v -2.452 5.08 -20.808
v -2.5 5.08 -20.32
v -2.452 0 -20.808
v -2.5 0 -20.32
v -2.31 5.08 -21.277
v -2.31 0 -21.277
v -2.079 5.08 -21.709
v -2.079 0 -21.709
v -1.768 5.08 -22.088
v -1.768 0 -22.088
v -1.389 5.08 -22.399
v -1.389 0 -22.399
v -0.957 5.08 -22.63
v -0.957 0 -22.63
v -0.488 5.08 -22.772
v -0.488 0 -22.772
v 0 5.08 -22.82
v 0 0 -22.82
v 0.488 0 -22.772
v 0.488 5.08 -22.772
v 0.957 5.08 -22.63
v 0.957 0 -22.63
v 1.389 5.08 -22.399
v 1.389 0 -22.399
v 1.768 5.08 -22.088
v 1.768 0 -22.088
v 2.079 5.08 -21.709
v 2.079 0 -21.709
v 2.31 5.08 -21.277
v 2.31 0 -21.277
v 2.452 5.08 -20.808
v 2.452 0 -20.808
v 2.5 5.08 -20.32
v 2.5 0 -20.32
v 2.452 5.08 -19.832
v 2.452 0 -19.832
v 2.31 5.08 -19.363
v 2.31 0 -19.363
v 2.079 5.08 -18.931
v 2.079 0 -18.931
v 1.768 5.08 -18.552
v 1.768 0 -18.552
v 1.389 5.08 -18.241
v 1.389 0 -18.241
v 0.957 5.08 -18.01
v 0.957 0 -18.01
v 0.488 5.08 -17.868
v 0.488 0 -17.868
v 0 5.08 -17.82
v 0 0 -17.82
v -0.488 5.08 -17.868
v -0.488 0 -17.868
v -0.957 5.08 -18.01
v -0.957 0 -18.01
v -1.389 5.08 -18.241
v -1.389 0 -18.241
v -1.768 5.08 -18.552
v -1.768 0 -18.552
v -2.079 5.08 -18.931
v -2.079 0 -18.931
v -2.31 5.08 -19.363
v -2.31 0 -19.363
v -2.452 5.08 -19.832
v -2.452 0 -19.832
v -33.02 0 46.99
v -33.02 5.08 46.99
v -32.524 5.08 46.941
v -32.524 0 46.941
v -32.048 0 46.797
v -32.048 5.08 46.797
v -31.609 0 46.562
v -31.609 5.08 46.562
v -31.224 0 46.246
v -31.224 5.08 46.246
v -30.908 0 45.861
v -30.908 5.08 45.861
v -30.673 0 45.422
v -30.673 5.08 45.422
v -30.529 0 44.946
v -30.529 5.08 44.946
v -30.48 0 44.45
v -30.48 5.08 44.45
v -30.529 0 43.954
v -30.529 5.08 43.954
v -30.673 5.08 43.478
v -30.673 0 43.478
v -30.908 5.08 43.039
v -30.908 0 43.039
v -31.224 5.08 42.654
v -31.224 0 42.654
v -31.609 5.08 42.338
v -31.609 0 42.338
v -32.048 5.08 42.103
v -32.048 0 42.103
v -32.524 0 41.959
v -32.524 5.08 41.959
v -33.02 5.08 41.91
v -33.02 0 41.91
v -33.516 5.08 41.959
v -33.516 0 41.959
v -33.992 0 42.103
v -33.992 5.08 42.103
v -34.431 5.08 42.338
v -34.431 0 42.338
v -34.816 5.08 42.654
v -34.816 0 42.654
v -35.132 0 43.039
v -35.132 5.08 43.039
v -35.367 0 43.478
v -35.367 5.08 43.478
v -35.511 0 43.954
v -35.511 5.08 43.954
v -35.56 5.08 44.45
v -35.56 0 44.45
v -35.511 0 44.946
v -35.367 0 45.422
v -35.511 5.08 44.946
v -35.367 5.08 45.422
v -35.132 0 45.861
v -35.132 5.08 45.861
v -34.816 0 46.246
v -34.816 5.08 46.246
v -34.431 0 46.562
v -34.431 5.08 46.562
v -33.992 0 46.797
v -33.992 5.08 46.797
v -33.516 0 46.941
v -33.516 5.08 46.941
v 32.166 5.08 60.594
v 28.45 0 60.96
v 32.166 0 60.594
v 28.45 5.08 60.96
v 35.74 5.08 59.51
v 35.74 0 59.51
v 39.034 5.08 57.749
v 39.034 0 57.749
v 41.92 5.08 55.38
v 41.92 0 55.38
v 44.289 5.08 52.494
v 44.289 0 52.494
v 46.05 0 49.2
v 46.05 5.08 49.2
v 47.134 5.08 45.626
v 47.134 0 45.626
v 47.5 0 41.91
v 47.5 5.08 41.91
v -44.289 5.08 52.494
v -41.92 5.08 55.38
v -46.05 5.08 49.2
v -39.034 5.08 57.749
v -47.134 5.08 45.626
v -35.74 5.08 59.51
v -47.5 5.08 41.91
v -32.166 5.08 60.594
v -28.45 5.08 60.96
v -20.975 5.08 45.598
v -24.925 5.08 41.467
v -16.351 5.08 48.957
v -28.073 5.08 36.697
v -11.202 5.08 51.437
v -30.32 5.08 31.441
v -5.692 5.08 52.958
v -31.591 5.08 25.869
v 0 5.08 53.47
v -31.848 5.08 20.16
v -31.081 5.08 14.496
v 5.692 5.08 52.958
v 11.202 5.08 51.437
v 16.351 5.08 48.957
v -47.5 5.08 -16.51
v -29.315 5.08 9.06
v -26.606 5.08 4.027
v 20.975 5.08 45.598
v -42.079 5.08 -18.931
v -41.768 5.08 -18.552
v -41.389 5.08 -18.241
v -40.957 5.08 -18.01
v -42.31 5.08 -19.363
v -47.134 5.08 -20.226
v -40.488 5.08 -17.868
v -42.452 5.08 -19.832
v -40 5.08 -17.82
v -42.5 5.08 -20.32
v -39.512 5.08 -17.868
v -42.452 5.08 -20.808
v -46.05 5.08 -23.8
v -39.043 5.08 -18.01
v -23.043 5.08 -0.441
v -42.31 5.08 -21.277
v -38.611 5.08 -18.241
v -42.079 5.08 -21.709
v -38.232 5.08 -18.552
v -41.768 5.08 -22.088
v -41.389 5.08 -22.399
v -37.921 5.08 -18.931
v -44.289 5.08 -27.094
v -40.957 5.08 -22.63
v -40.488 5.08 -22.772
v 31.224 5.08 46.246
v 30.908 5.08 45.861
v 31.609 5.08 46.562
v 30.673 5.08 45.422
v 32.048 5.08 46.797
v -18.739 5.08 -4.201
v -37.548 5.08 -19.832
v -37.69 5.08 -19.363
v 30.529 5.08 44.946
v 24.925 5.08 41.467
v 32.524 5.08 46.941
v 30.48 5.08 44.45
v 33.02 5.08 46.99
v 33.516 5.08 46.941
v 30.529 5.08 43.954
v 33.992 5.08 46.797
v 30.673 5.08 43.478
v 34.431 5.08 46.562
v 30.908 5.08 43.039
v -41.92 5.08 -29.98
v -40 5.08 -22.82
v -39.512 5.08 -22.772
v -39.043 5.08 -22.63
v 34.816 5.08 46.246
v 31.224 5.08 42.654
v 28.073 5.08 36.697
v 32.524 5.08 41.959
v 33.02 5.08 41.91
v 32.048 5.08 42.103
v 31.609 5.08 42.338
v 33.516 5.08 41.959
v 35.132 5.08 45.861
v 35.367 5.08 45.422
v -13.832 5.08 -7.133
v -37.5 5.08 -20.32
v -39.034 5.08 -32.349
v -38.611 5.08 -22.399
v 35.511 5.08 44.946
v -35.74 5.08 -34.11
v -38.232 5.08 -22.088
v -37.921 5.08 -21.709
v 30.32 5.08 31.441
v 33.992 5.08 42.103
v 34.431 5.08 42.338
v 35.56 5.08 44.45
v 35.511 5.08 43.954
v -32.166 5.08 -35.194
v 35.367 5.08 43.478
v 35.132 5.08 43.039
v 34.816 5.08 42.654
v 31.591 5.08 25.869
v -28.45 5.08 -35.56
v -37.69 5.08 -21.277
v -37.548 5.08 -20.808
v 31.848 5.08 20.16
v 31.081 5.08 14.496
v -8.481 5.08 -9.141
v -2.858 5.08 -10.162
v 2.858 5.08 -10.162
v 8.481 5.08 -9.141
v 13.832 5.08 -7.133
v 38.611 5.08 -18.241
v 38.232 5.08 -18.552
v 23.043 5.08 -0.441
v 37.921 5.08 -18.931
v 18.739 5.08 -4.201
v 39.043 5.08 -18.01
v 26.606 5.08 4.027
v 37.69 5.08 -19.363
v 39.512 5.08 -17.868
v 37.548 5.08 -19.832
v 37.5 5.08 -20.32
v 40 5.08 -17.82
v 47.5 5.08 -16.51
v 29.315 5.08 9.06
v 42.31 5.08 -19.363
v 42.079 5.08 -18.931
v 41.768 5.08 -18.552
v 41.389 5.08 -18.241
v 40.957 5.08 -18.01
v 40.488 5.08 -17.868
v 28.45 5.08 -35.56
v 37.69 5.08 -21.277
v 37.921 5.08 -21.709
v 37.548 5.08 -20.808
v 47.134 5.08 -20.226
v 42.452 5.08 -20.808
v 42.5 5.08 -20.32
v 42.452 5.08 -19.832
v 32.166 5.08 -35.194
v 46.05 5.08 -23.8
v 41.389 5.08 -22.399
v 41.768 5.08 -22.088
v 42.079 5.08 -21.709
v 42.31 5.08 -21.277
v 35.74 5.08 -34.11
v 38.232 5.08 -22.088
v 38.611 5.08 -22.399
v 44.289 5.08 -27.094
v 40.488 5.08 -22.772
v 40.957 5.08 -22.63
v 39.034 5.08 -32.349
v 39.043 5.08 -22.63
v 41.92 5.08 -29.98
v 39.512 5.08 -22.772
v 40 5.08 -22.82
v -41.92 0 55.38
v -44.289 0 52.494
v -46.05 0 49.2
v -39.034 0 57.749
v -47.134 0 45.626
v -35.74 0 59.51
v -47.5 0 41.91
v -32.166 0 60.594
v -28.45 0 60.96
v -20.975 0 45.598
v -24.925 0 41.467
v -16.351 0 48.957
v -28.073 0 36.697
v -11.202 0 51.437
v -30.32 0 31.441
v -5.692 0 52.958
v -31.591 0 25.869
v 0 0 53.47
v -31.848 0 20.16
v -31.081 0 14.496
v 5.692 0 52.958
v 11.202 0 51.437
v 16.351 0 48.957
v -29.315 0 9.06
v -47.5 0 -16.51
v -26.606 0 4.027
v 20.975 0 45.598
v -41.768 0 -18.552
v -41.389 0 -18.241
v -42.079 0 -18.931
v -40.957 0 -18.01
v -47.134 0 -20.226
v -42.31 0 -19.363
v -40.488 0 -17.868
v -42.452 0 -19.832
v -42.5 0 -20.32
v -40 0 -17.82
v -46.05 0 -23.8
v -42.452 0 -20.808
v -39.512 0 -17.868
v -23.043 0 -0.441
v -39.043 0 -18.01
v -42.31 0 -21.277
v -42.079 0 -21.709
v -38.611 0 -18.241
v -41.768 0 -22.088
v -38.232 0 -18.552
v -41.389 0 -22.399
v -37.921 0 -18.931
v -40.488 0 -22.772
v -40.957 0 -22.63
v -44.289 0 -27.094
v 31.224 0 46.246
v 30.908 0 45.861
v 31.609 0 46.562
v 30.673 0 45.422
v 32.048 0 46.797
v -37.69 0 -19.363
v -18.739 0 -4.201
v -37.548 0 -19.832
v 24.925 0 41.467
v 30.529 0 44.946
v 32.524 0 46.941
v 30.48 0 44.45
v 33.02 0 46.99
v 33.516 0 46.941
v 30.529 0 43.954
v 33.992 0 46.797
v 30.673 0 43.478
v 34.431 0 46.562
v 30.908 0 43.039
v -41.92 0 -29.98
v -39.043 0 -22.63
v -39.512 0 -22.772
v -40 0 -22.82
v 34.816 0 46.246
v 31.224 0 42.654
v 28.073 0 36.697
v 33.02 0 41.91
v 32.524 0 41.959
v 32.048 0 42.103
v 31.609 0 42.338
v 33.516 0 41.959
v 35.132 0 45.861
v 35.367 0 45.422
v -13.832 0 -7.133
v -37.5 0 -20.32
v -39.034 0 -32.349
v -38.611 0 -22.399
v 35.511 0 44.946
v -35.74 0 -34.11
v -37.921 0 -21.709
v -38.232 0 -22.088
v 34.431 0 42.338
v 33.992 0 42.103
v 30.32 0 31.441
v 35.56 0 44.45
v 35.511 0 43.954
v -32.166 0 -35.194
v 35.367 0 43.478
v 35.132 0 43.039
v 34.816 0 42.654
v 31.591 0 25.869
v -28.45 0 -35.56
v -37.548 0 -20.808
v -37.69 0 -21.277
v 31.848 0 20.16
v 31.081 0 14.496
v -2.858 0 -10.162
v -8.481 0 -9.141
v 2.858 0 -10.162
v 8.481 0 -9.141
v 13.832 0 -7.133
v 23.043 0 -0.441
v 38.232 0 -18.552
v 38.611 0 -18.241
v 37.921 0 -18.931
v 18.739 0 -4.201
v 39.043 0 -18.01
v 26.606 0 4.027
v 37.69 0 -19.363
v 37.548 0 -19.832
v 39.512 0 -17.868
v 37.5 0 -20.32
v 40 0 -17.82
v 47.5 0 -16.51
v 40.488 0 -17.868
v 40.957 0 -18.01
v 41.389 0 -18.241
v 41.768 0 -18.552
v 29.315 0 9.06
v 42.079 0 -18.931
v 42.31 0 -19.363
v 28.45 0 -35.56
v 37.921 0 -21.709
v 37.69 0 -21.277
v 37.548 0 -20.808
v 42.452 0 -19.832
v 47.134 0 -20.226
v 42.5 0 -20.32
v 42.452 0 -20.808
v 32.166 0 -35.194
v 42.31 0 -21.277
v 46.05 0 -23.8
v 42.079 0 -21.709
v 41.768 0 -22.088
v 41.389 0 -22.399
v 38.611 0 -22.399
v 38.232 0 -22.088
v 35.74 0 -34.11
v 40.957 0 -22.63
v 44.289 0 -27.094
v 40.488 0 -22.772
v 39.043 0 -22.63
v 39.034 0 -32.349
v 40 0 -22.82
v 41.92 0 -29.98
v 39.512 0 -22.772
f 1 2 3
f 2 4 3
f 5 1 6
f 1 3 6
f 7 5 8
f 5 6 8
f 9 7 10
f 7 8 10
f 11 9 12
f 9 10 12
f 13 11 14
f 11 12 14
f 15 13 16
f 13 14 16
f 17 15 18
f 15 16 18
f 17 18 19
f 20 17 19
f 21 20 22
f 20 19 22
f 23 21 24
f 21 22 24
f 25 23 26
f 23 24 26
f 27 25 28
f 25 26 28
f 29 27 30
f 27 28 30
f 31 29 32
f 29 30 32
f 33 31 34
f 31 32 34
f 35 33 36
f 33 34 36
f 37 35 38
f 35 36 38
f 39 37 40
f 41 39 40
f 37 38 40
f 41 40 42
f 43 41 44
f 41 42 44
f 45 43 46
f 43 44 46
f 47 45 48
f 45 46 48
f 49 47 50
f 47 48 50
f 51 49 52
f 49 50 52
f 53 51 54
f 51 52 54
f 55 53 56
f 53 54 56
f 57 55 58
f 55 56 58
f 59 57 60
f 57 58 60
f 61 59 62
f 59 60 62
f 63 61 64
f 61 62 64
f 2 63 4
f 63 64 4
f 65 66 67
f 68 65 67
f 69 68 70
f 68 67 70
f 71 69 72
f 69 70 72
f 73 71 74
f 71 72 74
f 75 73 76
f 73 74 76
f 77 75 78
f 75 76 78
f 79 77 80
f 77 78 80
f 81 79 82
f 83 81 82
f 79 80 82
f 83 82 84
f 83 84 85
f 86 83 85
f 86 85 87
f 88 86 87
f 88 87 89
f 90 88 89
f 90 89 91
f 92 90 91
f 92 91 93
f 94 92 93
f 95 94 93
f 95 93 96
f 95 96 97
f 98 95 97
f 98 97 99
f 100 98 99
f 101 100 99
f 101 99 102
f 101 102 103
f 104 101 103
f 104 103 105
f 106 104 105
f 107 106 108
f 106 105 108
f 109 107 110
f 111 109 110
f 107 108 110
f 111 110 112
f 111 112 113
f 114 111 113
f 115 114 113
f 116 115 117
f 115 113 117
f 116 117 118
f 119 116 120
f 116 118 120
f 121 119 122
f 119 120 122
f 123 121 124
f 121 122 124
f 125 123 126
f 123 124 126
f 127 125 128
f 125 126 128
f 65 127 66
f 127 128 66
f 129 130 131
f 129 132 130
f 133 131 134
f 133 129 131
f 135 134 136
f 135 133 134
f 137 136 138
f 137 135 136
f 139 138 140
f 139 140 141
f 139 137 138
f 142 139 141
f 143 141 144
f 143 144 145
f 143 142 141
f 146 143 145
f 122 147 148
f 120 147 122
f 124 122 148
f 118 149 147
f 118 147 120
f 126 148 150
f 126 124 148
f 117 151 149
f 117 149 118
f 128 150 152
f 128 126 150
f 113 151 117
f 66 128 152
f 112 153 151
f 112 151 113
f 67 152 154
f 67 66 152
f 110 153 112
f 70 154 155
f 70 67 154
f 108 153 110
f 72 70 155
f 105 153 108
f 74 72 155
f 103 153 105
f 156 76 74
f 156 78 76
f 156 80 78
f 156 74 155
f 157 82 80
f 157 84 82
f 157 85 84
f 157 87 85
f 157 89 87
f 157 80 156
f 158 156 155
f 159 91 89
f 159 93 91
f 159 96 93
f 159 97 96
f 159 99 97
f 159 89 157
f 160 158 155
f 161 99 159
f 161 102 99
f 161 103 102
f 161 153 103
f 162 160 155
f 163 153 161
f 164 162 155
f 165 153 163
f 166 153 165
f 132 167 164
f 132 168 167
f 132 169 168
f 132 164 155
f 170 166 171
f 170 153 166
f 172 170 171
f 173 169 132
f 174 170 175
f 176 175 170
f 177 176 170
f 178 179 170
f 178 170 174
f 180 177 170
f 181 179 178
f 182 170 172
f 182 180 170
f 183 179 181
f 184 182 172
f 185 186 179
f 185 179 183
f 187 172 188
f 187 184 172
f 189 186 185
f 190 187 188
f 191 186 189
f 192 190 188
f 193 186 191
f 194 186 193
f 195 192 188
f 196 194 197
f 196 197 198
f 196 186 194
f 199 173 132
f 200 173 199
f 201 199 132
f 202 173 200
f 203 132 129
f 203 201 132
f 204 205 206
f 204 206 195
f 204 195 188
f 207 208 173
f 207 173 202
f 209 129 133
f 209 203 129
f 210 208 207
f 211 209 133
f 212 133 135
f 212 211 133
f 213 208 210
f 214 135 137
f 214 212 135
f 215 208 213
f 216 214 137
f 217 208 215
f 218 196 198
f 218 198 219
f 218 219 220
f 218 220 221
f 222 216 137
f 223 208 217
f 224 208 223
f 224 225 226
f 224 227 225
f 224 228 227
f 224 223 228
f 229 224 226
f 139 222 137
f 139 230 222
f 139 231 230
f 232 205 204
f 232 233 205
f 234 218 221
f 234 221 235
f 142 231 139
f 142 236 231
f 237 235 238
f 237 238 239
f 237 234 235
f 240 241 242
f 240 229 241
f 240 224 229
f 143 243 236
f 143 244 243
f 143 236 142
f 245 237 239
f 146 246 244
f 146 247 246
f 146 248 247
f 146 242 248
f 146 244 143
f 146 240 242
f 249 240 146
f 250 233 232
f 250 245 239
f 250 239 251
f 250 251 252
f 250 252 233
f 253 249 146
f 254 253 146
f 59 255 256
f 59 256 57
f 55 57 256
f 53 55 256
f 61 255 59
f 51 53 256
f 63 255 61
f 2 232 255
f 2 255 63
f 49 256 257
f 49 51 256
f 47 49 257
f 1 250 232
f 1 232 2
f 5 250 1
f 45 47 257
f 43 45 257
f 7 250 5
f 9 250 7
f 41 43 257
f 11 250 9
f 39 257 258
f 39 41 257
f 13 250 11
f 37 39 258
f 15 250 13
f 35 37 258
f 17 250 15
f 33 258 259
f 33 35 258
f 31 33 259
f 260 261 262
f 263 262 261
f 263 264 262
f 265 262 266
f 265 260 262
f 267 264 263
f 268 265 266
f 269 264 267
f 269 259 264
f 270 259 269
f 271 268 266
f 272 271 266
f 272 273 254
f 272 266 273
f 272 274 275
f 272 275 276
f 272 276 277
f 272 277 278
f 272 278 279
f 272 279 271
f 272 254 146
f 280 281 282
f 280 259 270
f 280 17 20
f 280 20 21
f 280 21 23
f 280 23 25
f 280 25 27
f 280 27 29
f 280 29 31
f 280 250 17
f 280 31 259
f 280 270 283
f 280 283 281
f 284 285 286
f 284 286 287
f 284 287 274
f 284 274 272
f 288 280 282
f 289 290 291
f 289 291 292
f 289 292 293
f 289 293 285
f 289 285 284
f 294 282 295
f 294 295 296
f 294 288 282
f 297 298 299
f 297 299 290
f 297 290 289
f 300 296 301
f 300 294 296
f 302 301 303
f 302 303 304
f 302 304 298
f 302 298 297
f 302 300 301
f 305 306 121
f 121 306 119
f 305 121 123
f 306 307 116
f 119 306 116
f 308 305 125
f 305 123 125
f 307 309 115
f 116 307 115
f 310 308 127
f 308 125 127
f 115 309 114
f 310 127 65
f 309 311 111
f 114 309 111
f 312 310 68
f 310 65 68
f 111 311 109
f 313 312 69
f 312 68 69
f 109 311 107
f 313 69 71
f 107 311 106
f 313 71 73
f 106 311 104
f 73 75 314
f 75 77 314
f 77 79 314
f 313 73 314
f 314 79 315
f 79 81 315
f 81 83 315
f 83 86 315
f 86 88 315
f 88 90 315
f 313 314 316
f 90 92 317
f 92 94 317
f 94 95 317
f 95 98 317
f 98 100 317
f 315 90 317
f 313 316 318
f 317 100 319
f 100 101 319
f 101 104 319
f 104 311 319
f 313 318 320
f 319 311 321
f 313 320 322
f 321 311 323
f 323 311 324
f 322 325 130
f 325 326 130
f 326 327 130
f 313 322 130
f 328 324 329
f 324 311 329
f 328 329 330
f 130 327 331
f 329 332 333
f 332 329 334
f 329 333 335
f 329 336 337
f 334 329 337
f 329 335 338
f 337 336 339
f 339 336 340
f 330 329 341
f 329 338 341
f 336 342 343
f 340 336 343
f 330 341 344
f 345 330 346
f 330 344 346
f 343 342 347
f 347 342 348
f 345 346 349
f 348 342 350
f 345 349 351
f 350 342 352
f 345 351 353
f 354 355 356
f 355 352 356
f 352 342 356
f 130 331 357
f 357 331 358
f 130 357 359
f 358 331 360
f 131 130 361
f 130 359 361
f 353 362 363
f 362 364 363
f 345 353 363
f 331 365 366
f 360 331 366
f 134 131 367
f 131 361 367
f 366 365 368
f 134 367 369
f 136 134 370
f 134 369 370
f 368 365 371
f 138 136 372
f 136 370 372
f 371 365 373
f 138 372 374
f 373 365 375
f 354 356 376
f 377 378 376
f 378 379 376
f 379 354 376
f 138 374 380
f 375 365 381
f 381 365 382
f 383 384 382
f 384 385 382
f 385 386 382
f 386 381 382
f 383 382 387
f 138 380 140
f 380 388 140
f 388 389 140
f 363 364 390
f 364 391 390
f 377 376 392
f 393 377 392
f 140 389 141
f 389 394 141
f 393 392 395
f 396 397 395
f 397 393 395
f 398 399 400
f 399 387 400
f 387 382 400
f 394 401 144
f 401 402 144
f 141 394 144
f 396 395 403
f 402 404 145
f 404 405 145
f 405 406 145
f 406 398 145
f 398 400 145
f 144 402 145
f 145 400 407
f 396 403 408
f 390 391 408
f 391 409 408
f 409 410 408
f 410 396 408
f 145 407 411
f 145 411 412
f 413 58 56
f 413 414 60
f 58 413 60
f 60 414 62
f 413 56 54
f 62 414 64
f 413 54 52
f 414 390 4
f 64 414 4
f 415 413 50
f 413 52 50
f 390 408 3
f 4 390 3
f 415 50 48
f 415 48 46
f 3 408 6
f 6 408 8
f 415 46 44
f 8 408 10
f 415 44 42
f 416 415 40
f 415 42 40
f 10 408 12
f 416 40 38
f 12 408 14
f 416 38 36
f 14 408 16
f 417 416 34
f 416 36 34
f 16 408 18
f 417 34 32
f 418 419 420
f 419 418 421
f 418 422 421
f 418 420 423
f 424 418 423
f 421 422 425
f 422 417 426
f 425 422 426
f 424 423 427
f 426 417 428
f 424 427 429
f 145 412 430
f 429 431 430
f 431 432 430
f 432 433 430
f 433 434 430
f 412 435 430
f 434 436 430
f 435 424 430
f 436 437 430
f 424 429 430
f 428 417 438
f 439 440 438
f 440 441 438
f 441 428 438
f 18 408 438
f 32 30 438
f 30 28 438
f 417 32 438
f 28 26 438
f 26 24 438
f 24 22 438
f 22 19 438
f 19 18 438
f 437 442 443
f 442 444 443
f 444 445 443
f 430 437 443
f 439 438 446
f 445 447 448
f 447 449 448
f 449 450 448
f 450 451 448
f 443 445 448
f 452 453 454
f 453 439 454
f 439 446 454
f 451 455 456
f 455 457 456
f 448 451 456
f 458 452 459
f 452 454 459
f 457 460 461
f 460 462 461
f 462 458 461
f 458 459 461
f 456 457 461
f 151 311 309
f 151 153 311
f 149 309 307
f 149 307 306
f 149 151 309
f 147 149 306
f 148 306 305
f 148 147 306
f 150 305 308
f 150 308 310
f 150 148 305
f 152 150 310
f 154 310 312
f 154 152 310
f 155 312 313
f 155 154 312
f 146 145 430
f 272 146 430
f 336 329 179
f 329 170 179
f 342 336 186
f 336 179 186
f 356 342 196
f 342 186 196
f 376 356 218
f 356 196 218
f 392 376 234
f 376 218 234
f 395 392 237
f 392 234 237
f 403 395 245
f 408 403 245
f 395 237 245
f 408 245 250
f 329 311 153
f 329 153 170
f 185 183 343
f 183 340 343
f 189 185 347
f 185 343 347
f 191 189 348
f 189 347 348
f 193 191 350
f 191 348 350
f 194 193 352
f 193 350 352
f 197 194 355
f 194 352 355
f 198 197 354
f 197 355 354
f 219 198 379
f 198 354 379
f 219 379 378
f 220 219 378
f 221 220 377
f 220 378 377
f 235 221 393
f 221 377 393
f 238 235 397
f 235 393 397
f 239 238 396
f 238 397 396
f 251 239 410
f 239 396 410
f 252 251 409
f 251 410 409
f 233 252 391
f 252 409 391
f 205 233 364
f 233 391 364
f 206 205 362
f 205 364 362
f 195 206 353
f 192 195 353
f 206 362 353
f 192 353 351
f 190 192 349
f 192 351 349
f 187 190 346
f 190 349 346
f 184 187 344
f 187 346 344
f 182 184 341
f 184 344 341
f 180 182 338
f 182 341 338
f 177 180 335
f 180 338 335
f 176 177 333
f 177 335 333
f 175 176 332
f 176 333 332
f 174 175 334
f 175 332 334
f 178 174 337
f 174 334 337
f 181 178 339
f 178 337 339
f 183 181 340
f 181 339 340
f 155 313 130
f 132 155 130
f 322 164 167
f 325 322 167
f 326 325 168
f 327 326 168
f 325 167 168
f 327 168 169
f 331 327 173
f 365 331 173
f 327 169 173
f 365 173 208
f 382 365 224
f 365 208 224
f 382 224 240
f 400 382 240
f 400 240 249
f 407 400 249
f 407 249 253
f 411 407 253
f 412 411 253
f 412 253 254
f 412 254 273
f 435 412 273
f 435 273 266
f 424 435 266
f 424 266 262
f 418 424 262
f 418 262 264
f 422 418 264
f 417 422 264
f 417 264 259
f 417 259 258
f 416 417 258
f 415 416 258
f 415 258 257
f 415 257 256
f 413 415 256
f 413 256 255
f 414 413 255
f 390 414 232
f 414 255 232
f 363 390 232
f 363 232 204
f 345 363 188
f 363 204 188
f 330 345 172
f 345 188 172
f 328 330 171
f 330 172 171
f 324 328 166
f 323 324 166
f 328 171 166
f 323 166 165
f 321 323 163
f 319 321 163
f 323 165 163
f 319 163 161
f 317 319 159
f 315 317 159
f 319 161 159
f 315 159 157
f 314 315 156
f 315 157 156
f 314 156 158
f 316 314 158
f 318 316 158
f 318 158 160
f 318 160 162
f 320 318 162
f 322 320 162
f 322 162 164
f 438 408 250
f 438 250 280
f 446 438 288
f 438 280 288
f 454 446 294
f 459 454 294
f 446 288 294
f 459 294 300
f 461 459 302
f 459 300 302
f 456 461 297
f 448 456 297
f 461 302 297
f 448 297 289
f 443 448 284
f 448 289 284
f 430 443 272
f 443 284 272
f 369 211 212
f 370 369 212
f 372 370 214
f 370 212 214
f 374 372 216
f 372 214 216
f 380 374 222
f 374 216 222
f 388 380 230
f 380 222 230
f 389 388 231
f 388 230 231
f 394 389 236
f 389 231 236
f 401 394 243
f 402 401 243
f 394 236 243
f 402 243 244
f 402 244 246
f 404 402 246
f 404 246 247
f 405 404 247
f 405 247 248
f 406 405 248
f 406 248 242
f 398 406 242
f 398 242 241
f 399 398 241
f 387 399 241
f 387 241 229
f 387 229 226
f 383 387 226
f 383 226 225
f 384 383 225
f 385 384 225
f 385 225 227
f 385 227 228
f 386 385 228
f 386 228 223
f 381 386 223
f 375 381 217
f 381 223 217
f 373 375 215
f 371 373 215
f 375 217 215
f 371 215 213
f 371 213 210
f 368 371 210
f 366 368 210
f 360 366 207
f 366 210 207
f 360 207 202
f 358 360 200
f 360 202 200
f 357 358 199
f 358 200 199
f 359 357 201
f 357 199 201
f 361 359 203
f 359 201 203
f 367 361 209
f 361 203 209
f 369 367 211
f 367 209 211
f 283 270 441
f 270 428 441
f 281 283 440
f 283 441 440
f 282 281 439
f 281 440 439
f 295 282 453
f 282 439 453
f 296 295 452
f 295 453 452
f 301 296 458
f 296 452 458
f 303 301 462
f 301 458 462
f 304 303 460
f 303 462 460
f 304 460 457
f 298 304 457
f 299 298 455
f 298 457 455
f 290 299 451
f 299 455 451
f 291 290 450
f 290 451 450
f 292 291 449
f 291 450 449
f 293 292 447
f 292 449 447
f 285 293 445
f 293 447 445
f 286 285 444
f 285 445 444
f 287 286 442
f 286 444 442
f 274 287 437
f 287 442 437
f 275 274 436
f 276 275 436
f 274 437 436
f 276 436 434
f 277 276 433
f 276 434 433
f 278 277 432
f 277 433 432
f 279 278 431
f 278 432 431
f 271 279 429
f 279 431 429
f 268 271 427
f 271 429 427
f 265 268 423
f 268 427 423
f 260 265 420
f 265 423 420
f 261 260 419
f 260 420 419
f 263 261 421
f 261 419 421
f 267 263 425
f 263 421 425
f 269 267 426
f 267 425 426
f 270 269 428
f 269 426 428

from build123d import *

# Parameters (mm, degrees)
SKETCH2_W                 = 95
SKETCH2_H                 = 96.52
BOSS_EXTRUDE3_DEPTH       = 5.08
SKETCH3_R                 = 31.879999994
CUT_EXTRUDE1_DEPTH        = 78.447905072
M6X1_0_TAPPED_HOLE1_D     = 5
M6X1_0_TAPPED_HOLE1_DEPTH = 5.08
M6X1_0_TAPPED_HOLE1_TIP   = 1.502151548
SKETCH7_R                 = 2.54
CUT_EXTRUDE2_DEPTH        = 7.62
FILLET1_R                 = 19.05


with BuildPart() as part:
    # Sketch2 → Boss-Extrude3 (new body)
    with BuildSketch(Plane(origin=(0, 0, 0), x_dir=(1, 0, 0), z_dir=(0, 1, 0))):
        with Locations((0, -12.7)):
            Rectangle(SKETCH2_W, SKETCH2_H)
    extrude(amount=BOSS_EXTRUDE3_DEPTH)

    # Sketch3 → Cut-Extrude1 (cut, through all)
    with BuildSketch(Plane(origin=(0, 5.08, 0), x_dir=(1, 0, 0), z_dir=(0, 1, 0))):
        with Locations(Location((0, -21.59, 0), (0, 0, 270))):
            Circle(SKETCH3_R)
    extrude(amount=-CUT_EXTRUDE1_DEPTH, mode=Mode.SUBTRACT)

    # M6x1.0 Tapped Hole1
    with Locations(Plane(origin=(0, 5.08, 0), x_dir=(1, 0, 0), z_dir=(0, 1, 0))):
        with Locations((-40, 20.32), (40, 20.32), (0, 20.32)):
            Hole(M6X1_0_TAPPED_HOLE1_D / 2, depth=M6X1_0_TAPPED_HOLE1_DEPTH)
            with Locations((0, 0, -(M6X1_0_TAPPED_HOLE1_DEPTH + M6X1_0_TAPPED_HOLE1_TIP / 2))):  # 118° drill point
                Cone(0, M6X1_0_TAPPED_HOLE1_D / 2, M6X1_0_TAPPED_HOLE1_TIP, mode=Mode.SUBTRACT)

    # Sketch7 → Cut-Extrude2 (cut)
    with BuildSketch(Plane(origin=(0, 5.08, 0), x_dir=(1, 0, 0), z_dir=(0, 1, 0))):
        with Locations(Location((-33.02, -44.45, 0), (0, 0, 270))):
            Circle(SKETCH7_R)
        with Locations(Location((33.02, -44.45, 0), (0, 0, 270))):
            Circle(SKETCH7_R)
    extrude(amount=-CUT_EXTRUDE2_DEPTH, mode=Mode.SUBTRACT)

    # Fillet1
    fillet1_edges = [part.edges().sort_by_distance(p)[0] for p in [
        (47.5, 2.54, -35.56),
        (47.5, 2.54, 60.96),
        (-47.5, 2.54, 60.96),
        (-47.5, 2.54, -35.56),
    ]]
    fillet(fillet1_edges, radius=FILLET1_R)


solid = part.part
